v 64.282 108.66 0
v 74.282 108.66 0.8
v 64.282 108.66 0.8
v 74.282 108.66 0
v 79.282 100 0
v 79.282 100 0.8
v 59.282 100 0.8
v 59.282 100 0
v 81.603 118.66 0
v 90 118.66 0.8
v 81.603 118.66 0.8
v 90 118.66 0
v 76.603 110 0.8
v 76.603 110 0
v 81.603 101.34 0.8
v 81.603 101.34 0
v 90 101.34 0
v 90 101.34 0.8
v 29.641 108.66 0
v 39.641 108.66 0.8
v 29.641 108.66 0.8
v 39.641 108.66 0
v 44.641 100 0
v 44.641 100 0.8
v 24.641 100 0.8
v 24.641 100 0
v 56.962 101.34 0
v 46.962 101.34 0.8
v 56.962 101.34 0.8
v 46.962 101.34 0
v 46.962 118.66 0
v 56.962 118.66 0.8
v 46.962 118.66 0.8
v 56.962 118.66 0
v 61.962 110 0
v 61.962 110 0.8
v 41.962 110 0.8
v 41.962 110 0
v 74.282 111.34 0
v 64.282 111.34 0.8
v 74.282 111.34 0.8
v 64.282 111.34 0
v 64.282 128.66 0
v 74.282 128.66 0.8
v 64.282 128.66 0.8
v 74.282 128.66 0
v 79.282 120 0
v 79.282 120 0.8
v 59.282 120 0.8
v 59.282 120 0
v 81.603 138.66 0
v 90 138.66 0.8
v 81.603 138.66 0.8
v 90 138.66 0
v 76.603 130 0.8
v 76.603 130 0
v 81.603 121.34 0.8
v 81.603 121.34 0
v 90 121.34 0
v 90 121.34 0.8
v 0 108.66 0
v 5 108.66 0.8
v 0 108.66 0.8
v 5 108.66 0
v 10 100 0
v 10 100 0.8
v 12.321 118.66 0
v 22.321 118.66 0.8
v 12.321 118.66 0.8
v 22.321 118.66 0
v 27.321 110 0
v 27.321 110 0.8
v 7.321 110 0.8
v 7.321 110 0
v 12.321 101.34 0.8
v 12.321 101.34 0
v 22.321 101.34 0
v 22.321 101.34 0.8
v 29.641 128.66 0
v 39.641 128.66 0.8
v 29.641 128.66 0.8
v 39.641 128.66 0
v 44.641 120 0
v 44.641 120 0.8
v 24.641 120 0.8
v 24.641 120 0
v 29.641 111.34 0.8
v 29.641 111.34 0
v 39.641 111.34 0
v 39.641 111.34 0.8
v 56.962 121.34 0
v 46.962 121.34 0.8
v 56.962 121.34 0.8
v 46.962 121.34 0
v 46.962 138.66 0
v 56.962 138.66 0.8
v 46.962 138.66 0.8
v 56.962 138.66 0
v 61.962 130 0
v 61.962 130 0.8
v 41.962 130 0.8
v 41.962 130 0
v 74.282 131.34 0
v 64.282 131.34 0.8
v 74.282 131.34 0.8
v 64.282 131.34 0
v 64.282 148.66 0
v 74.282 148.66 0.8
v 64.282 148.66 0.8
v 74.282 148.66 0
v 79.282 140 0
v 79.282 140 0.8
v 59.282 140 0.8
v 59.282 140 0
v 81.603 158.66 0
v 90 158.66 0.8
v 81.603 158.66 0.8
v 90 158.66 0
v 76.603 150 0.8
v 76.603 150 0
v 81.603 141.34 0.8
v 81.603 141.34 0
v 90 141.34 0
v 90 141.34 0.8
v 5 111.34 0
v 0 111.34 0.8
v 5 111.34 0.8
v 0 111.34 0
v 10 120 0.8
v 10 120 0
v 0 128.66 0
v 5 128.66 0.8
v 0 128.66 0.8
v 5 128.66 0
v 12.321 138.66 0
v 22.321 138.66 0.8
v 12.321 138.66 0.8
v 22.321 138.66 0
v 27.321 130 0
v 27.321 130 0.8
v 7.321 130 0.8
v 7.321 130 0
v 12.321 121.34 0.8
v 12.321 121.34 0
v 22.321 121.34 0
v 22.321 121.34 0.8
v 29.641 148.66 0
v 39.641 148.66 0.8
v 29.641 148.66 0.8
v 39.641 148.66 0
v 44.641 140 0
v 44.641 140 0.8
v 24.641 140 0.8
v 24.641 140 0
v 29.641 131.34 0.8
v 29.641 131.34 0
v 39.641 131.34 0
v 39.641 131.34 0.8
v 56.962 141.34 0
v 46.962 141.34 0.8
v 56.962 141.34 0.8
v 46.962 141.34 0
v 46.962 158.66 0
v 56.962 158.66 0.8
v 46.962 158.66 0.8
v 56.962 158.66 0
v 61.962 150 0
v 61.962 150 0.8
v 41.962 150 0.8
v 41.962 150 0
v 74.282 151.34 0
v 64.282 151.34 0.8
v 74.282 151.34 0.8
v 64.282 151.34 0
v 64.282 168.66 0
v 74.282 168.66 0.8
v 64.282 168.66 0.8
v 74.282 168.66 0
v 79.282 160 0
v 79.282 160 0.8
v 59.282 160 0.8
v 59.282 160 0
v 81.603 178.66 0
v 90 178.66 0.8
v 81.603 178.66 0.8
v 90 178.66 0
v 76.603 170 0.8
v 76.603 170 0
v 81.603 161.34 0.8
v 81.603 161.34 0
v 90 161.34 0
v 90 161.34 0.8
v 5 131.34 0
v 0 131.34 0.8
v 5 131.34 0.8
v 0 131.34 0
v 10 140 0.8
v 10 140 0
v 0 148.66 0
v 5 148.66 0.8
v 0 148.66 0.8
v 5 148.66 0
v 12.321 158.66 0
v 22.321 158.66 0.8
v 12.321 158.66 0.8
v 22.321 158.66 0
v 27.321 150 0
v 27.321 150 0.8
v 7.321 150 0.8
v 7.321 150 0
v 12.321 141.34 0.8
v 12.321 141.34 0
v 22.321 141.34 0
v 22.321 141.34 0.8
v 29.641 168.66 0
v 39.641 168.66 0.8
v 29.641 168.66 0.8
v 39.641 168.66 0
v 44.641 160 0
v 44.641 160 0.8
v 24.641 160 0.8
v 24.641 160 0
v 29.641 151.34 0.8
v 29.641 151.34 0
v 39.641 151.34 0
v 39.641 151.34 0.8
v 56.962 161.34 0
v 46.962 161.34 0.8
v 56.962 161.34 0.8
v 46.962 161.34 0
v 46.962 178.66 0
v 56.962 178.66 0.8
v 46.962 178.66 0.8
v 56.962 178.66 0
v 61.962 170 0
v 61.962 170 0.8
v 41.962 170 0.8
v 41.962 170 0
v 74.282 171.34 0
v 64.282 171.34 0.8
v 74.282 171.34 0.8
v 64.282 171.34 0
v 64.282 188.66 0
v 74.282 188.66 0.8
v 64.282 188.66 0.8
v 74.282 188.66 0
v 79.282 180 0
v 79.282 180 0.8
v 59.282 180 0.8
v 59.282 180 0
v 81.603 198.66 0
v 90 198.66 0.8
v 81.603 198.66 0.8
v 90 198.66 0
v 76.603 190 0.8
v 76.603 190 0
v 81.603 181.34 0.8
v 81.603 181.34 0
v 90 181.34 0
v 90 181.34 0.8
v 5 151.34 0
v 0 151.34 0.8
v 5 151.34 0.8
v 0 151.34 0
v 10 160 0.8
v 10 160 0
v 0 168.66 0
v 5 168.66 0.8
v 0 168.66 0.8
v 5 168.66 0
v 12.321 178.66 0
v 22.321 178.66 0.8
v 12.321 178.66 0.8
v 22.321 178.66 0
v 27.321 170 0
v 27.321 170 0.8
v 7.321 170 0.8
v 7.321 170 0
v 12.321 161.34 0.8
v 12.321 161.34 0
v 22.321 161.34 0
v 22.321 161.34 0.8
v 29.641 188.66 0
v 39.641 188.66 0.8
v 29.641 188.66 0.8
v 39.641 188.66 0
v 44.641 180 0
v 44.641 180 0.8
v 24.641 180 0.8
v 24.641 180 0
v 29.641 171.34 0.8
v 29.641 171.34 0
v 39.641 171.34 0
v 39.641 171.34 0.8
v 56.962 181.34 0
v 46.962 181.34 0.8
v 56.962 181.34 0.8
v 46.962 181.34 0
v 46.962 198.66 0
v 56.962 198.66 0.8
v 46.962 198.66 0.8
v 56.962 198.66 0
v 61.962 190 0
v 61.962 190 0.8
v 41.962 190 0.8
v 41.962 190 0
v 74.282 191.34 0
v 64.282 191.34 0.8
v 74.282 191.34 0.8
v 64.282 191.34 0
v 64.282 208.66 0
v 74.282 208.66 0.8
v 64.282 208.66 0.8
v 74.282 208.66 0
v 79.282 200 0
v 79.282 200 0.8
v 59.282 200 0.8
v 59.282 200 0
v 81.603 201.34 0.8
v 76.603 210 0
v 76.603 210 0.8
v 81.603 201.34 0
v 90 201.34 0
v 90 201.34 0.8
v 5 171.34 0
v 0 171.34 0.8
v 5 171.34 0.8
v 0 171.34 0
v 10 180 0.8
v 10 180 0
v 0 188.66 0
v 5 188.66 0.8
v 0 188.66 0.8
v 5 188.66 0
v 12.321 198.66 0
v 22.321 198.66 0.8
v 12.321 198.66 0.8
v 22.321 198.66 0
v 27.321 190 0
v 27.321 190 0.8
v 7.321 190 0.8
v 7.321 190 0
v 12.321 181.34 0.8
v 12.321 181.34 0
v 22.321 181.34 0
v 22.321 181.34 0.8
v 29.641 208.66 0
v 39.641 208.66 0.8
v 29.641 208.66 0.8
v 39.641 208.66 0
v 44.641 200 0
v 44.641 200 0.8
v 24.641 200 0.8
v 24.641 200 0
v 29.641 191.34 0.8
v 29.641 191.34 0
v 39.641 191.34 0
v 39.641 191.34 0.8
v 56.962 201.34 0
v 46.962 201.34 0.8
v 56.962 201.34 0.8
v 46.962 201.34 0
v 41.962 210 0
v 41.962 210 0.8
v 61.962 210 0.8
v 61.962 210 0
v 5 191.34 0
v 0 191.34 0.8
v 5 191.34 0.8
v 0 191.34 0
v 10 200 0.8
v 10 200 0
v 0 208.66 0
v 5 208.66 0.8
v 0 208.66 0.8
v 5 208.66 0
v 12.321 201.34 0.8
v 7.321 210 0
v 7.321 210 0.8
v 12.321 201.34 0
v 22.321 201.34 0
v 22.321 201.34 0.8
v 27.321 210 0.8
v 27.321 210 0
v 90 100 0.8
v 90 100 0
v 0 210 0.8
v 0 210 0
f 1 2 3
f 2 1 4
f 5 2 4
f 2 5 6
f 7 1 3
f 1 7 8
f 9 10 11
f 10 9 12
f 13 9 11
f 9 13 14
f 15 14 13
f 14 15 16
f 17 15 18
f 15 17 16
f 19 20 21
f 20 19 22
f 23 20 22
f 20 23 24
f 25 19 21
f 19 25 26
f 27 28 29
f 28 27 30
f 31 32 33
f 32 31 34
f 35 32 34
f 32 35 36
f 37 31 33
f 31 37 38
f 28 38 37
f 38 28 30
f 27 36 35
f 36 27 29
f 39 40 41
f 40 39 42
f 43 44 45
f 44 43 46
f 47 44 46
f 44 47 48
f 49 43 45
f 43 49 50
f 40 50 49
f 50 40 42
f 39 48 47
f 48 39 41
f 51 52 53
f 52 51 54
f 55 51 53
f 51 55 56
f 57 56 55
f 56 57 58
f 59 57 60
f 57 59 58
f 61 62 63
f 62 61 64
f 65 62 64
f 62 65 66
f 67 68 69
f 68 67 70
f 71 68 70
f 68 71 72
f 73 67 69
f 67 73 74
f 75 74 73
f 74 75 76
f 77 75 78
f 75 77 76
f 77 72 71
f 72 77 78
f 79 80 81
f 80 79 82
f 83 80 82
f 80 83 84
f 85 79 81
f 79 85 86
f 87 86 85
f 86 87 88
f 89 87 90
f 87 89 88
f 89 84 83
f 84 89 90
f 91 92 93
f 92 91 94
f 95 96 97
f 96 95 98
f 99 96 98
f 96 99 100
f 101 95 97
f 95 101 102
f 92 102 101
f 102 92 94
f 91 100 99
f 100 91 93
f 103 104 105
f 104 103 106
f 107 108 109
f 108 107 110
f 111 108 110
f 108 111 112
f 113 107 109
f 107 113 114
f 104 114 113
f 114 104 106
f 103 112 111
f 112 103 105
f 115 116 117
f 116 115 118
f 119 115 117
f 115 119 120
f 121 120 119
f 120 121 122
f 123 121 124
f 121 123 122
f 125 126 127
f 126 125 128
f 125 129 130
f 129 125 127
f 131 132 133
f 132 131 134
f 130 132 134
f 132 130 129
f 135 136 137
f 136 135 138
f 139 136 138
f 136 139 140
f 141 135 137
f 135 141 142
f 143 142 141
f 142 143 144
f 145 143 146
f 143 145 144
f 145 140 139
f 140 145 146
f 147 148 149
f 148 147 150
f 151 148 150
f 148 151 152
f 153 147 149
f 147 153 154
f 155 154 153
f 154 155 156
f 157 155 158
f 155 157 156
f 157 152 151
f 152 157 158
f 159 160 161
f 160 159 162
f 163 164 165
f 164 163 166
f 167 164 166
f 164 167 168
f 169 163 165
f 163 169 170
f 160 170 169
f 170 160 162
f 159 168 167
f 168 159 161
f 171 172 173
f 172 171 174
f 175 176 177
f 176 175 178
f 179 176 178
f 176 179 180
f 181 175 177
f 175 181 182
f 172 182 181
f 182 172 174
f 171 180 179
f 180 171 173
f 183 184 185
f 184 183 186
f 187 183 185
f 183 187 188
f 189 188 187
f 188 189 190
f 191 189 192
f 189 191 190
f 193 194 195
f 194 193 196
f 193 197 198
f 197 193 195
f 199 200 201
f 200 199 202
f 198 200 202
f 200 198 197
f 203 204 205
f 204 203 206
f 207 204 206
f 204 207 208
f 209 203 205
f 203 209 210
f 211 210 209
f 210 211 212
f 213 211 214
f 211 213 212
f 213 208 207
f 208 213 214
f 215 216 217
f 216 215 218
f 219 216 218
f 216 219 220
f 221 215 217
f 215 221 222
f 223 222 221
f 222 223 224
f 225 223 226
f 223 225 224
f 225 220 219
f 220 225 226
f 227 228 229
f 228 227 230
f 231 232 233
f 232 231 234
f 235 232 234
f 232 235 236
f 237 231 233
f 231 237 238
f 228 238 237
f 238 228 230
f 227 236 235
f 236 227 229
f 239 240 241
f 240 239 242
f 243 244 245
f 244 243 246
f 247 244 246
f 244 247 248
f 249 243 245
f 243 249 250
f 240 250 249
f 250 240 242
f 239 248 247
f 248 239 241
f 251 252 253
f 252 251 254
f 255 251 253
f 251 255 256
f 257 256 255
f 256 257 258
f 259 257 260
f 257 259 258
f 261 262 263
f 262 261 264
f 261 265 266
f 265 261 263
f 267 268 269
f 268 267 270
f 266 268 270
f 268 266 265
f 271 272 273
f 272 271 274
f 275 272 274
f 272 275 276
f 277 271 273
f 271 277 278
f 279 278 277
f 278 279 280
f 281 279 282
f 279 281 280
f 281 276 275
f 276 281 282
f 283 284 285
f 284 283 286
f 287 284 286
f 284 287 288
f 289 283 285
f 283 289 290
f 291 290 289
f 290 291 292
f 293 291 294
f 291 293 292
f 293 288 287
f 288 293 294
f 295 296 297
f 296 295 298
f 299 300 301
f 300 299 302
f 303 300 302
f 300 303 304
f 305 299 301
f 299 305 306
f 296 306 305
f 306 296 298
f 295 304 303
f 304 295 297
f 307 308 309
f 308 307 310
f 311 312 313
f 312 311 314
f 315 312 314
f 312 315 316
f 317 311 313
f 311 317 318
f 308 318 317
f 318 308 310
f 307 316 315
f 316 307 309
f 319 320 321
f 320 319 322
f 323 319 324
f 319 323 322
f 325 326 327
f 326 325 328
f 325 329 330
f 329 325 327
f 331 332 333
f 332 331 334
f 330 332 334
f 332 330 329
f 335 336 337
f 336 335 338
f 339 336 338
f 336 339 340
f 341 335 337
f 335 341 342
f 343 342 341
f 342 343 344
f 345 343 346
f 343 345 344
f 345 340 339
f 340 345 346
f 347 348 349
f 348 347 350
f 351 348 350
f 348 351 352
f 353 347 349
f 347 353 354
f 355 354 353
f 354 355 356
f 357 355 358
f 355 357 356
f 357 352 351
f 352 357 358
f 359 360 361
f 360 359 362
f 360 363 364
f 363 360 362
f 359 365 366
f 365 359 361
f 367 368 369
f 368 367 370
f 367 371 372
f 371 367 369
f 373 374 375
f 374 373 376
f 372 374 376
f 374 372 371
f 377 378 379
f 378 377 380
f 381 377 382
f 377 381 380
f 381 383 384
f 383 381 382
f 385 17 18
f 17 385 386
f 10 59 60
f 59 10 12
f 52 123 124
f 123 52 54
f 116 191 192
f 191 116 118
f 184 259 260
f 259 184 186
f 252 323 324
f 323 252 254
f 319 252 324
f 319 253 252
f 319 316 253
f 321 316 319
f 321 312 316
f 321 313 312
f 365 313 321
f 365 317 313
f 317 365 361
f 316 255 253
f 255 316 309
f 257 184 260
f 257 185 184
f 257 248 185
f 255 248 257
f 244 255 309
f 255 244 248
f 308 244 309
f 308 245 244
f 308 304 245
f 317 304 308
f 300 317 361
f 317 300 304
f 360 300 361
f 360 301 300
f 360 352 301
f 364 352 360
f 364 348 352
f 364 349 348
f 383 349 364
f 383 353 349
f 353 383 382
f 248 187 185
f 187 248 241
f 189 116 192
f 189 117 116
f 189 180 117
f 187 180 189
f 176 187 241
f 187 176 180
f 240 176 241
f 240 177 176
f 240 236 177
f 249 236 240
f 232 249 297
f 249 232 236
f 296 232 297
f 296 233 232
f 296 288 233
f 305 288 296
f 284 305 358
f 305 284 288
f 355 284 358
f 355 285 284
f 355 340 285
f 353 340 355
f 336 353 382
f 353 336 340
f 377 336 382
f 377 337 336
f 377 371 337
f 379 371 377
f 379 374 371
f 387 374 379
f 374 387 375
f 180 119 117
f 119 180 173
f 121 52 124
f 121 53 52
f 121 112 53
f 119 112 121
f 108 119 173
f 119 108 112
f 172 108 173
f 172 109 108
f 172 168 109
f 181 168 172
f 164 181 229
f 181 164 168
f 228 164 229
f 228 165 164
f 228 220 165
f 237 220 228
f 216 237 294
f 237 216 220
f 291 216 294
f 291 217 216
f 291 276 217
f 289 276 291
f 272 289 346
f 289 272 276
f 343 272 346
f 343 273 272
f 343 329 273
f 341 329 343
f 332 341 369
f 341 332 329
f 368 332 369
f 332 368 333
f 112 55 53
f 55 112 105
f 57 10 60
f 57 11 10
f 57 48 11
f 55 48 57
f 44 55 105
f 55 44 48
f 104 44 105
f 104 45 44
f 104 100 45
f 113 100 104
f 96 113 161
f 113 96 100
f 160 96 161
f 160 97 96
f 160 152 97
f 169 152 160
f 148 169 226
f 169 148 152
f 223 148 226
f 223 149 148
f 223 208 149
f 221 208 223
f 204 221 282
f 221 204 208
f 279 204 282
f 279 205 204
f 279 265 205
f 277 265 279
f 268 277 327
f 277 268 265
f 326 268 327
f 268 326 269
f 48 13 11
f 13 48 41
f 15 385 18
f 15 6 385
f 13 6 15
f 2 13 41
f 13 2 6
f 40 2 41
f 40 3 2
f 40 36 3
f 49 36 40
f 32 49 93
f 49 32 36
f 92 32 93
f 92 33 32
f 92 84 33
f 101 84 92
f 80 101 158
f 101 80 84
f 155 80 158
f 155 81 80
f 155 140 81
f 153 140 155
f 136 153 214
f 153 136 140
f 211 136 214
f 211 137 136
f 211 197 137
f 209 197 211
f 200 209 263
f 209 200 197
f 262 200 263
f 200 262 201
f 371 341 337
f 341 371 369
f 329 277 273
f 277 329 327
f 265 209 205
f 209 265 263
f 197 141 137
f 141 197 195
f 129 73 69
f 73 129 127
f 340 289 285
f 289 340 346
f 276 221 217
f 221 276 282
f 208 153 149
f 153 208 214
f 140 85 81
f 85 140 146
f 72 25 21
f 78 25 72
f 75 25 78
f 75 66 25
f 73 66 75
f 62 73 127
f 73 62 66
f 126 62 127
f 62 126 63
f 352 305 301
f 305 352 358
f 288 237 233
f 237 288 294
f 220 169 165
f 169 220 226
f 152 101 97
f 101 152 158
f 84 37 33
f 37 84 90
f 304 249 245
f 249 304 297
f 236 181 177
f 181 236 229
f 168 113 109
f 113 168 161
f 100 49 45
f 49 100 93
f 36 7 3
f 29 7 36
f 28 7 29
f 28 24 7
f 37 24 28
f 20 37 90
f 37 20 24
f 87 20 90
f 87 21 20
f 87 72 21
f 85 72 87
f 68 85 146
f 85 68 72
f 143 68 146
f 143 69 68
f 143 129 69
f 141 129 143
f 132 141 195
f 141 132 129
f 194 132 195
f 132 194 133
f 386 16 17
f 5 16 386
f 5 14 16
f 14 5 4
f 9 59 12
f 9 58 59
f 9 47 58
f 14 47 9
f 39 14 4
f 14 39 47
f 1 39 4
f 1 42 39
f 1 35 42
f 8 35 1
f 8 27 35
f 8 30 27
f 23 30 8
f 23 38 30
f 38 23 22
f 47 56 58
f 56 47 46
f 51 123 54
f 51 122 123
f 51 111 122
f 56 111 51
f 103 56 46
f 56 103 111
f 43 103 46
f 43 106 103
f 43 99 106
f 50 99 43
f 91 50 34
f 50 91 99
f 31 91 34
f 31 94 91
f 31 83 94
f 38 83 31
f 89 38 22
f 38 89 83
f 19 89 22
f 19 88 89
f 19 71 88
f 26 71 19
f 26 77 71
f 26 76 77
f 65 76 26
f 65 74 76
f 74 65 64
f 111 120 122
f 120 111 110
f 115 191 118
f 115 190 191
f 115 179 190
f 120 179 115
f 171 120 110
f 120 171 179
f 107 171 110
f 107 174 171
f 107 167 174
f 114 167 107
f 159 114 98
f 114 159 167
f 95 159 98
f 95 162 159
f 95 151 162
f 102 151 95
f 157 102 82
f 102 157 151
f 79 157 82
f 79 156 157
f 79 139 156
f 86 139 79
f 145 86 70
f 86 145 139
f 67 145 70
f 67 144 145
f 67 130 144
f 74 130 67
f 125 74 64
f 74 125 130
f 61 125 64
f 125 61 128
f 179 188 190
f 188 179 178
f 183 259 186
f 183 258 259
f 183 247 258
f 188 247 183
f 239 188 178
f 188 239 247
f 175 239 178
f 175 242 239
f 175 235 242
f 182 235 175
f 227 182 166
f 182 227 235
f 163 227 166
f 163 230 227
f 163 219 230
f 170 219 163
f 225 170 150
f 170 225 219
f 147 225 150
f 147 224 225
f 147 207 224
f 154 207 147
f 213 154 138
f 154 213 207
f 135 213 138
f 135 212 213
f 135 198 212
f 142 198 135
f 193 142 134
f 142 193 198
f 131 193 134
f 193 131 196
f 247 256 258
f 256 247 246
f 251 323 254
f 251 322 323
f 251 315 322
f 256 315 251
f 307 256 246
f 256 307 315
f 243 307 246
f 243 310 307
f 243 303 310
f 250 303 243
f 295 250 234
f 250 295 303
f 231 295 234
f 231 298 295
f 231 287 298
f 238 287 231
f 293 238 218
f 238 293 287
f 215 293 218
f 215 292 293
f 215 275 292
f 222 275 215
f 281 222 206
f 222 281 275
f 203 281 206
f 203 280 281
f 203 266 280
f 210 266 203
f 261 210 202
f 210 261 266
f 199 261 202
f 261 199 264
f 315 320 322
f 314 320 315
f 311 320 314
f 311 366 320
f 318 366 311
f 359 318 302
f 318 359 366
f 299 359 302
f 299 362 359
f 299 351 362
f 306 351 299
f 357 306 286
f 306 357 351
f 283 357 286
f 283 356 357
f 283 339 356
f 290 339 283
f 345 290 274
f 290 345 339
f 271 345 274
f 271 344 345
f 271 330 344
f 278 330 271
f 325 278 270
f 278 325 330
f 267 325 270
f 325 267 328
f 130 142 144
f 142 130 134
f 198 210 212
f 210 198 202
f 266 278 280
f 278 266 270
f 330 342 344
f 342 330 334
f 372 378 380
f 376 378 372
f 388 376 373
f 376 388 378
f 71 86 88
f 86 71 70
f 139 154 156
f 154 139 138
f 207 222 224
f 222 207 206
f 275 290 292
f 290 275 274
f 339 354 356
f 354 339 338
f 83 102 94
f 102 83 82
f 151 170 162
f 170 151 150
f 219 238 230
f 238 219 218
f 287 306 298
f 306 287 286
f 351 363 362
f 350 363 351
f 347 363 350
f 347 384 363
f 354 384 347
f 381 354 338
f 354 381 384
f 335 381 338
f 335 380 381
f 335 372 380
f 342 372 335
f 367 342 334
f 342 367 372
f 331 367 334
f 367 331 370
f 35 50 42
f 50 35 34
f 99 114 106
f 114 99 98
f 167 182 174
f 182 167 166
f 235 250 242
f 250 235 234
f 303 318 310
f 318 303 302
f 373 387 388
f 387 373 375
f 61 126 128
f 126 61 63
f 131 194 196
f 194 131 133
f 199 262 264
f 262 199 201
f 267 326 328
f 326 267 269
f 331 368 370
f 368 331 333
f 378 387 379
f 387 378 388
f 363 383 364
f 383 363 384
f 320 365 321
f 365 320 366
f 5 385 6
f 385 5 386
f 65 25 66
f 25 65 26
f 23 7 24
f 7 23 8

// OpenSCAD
diameter = 20;
space = 5;
cut_thickness = 3;
stencil_thickness = 0.8;

//off = (1.3*diameter)+space;
side = sqrt(3)/2*diameter;
module row(blocks = 9){
    
    for(x = [0:blocks]){
        translate([x*side,diameter/2*x,-1])
        cylinder(h=cut_thickness, d=diameter, $fn=6);
    }
}
module grid(blocks = 9){
    for(x = [0:blocks]){
        translate([0,x*diameter,0])
            row(blocks);
    }
}

difference(){
    translate([0,100,0])
   cube([90,110,stencil_thickness]);
    
    grid(20); 
}
